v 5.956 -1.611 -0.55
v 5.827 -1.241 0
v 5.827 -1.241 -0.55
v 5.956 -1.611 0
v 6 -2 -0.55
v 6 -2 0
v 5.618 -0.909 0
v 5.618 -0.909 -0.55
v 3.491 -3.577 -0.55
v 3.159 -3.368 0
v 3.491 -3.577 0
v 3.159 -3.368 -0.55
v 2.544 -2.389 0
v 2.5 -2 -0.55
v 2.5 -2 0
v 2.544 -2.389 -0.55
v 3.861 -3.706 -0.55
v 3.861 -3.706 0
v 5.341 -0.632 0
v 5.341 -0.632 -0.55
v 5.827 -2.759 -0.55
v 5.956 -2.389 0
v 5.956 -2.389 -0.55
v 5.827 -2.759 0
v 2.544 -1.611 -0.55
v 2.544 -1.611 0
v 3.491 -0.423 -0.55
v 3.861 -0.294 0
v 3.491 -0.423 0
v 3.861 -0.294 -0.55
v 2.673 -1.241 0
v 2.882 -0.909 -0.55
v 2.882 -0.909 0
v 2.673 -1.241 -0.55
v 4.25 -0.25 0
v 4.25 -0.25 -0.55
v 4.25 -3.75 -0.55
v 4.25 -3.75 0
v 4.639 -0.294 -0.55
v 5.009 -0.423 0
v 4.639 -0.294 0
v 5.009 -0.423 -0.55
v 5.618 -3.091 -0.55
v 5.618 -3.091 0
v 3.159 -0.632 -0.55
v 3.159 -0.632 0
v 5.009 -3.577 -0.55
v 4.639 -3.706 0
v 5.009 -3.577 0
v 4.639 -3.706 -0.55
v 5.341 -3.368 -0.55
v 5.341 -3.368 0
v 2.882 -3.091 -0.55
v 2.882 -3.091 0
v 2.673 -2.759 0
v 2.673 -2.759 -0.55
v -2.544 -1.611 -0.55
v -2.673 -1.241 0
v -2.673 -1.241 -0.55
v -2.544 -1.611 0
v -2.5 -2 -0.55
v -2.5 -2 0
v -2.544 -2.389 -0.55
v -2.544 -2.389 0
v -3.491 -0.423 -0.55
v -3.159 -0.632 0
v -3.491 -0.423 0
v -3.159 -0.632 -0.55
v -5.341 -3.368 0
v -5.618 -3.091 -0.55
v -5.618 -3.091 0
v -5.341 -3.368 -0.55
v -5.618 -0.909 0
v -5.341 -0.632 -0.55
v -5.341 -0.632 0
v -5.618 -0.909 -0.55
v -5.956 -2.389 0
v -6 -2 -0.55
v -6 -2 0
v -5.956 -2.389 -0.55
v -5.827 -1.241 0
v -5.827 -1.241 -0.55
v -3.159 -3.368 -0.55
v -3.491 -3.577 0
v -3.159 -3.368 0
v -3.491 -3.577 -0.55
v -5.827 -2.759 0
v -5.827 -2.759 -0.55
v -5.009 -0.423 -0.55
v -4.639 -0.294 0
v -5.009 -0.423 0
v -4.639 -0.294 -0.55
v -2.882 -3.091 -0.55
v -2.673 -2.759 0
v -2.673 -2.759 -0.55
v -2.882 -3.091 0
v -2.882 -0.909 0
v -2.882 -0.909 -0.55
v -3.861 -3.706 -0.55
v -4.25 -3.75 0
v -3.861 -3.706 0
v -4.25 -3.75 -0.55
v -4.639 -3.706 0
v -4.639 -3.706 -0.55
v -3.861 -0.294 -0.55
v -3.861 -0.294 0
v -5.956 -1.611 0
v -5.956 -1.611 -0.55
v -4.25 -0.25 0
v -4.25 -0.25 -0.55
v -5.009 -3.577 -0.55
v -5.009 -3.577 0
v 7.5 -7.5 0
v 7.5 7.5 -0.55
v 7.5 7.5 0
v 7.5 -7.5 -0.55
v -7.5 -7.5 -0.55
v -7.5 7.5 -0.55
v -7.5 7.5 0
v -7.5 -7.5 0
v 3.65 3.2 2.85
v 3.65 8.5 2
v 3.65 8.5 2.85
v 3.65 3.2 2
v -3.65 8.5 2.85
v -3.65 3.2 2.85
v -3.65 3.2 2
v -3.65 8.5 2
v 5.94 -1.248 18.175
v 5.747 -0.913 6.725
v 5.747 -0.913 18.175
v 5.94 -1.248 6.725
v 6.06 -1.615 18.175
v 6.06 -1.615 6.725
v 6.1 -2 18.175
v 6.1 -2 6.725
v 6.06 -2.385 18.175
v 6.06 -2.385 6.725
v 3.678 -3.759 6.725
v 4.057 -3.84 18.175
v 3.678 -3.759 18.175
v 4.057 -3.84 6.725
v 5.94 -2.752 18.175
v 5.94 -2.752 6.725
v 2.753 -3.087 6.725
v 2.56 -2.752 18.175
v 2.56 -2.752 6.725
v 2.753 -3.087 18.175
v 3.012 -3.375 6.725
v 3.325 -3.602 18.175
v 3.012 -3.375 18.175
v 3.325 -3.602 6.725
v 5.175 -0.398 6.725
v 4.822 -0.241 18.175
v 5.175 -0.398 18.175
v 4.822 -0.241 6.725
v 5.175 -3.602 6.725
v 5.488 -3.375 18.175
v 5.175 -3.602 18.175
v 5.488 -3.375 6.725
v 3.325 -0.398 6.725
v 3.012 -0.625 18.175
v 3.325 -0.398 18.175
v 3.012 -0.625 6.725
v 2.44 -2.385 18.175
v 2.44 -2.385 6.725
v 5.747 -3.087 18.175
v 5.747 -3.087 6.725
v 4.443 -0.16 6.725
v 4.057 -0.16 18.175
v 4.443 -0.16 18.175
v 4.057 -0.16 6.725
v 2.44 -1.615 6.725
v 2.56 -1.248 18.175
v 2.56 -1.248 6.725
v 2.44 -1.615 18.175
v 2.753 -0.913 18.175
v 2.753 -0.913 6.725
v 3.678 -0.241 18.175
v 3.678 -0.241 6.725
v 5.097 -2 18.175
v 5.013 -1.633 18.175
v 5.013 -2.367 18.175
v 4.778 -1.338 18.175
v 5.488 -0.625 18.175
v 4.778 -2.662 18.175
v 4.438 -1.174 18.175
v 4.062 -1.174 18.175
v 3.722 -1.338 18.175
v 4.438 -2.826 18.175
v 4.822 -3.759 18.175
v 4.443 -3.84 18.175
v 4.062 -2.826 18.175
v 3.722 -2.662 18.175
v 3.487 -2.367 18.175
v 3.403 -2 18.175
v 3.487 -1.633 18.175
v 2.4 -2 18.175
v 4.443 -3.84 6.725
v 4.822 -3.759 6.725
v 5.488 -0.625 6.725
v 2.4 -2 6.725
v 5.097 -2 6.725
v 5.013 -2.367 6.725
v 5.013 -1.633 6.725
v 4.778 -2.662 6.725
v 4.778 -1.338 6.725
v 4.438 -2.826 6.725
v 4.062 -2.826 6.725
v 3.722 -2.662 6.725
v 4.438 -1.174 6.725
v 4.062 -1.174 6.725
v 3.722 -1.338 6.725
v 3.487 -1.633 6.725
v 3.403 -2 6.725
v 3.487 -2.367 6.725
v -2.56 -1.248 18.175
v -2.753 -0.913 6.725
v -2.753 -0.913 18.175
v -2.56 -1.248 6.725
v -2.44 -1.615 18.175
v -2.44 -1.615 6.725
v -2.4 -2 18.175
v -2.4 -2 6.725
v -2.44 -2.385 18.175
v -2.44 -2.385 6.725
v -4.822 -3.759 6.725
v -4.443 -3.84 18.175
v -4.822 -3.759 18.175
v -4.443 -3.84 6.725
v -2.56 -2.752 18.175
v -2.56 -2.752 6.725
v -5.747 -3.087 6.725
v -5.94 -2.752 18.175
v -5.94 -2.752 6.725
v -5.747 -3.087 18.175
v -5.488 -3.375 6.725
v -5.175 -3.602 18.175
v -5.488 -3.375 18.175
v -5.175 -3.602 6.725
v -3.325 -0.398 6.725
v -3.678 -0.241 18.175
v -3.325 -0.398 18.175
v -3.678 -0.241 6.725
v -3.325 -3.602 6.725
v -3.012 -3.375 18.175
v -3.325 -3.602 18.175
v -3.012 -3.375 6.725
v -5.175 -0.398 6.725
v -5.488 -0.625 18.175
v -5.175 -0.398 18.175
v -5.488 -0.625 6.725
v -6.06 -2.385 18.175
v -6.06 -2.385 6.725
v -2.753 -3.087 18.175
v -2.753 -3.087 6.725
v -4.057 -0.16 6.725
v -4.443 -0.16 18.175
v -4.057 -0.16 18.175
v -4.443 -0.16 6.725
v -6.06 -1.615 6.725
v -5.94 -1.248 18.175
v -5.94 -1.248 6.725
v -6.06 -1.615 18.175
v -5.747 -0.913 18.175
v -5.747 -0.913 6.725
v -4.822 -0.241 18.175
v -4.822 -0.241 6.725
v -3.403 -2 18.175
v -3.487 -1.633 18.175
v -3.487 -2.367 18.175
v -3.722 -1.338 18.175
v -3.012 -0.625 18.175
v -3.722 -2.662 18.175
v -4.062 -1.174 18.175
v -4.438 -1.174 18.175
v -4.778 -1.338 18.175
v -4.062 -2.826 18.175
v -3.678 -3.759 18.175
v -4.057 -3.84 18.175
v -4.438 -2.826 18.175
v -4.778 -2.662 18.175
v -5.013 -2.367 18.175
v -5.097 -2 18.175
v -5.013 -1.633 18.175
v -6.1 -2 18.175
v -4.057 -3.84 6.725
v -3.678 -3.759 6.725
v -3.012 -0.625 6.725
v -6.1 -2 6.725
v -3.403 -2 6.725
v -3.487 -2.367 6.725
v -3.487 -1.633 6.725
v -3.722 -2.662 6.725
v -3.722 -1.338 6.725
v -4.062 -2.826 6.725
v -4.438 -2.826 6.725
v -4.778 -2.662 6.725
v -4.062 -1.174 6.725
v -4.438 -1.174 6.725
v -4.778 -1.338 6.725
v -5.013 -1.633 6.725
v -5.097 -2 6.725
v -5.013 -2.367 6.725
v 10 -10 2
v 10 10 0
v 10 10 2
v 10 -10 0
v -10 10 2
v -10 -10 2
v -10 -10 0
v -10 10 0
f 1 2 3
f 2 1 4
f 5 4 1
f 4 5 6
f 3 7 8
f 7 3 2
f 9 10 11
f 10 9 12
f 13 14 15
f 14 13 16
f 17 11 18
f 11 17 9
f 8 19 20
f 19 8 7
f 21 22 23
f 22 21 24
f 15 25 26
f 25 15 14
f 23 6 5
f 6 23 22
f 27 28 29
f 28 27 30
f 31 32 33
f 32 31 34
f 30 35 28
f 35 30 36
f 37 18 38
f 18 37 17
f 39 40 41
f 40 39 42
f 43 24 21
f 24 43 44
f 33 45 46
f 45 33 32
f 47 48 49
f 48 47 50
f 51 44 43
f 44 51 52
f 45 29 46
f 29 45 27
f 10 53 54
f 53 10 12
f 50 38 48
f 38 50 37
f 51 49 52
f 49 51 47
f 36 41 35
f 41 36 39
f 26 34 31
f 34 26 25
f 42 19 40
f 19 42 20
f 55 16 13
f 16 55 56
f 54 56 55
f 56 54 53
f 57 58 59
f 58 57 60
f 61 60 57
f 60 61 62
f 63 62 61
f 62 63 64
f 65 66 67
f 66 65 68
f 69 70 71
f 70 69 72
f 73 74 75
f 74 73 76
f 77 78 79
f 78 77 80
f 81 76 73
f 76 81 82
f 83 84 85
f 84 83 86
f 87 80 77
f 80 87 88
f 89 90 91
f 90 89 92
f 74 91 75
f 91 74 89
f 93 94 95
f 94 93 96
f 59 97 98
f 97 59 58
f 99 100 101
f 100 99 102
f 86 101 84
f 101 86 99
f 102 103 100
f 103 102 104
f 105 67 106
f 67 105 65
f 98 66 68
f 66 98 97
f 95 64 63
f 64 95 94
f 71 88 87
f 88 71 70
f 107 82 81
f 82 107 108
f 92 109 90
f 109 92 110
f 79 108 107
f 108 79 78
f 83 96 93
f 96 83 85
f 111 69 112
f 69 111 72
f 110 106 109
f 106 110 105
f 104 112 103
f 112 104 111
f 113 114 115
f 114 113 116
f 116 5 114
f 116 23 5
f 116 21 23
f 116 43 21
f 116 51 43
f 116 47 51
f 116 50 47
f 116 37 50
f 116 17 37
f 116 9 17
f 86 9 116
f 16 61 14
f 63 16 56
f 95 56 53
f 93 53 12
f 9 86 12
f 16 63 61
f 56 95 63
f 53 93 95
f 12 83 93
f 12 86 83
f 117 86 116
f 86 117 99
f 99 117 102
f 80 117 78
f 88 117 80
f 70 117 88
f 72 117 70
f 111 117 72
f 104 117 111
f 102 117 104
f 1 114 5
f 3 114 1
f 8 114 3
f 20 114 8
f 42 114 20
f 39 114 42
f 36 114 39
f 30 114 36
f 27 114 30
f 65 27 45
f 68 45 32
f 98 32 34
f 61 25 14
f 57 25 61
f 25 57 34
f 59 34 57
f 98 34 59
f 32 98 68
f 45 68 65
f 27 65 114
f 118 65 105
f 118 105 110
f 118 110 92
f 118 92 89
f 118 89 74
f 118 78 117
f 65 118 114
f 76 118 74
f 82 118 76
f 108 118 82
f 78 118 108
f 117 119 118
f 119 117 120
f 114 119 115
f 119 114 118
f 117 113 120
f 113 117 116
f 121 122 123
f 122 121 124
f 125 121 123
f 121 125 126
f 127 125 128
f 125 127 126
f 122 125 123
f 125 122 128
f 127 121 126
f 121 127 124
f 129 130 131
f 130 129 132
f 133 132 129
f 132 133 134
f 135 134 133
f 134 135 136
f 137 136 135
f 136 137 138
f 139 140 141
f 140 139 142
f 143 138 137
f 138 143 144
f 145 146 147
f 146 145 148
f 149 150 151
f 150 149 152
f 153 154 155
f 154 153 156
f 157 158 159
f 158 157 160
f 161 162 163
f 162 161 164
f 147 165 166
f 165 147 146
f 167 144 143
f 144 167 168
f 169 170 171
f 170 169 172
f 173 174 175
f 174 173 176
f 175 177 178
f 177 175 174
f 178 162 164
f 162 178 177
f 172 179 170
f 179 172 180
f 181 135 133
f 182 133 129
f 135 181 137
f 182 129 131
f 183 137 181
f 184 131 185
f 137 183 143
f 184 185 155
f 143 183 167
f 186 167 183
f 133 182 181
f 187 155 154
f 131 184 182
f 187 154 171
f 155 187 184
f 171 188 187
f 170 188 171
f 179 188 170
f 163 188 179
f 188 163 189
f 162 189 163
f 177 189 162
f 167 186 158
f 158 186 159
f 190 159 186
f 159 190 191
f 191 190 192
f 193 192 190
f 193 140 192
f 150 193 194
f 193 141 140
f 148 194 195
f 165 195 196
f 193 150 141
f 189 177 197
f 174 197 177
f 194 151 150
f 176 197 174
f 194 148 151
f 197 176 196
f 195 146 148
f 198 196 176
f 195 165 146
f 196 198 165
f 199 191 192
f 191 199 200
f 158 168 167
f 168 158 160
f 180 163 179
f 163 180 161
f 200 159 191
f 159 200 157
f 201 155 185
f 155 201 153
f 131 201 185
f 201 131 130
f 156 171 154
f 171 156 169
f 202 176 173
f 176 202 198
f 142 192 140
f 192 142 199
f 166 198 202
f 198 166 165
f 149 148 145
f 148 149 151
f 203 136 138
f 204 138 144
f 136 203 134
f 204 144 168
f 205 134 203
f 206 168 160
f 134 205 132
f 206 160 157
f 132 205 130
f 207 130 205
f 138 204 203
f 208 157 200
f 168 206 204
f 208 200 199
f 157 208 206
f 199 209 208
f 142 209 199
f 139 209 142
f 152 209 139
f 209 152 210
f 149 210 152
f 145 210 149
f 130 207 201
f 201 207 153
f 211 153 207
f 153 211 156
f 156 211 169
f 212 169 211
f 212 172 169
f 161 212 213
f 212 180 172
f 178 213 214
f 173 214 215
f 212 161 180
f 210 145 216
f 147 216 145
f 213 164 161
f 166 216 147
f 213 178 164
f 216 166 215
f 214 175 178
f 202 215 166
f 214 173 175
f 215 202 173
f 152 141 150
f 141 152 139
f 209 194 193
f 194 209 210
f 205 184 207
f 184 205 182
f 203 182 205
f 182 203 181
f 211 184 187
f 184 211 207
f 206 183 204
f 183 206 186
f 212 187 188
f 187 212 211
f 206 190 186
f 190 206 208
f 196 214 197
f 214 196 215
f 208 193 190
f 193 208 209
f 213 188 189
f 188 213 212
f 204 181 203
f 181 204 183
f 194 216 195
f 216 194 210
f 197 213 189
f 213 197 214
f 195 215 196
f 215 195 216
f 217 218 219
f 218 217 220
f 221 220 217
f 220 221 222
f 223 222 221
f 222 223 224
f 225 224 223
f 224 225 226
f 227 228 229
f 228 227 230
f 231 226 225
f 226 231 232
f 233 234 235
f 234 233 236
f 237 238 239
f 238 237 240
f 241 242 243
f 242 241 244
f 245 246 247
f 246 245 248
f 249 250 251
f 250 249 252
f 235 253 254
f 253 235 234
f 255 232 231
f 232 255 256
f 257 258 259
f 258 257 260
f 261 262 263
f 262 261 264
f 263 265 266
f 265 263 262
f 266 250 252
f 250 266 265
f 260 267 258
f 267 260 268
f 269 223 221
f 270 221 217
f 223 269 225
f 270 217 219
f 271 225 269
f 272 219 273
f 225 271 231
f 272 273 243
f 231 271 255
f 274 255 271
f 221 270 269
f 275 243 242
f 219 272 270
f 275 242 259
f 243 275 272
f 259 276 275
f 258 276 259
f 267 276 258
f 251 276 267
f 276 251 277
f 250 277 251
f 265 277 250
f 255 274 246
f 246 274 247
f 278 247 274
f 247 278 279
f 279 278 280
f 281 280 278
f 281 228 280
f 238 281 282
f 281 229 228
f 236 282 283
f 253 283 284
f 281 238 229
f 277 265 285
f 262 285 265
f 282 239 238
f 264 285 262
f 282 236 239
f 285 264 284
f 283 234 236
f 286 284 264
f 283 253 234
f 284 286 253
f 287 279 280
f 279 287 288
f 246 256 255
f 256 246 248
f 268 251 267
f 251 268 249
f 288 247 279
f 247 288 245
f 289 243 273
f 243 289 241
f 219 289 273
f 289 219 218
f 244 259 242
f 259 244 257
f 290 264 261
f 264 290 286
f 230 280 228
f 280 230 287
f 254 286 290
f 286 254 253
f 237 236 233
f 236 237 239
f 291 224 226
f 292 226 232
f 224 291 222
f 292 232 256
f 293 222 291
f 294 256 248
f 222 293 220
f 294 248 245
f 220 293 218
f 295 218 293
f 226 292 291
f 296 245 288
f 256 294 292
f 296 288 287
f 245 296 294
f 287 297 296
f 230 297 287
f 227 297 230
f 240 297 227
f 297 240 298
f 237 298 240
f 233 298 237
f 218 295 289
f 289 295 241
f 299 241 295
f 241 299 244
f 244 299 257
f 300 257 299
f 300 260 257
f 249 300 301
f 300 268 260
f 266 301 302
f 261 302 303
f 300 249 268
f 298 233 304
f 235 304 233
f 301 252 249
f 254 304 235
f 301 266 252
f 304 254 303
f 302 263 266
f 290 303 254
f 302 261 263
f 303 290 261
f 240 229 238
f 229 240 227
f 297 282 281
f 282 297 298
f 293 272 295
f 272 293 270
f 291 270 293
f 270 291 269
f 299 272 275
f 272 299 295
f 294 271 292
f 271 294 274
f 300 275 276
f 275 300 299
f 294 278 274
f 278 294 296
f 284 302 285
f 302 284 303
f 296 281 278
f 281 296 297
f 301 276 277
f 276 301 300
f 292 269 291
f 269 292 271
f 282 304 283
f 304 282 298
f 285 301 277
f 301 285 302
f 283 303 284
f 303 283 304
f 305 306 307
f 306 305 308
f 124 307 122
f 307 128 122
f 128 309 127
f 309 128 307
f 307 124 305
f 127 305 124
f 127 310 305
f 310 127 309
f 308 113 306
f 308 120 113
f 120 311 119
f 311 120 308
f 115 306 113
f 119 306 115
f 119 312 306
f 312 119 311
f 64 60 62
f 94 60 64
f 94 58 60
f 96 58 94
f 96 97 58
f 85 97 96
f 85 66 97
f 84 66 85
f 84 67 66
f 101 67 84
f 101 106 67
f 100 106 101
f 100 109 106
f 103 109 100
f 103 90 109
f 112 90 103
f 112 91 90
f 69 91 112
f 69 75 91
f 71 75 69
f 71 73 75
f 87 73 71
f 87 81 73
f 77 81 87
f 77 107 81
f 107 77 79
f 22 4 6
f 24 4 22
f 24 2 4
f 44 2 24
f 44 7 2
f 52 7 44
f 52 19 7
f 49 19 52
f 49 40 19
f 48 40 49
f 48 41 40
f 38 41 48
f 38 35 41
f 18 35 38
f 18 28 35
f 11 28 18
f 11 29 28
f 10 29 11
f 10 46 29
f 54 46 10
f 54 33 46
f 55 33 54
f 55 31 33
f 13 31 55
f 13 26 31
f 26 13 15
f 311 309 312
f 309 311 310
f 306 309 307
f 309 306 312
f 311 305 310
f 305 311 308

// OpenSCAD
// file: usb_board.scad
// USB Connector Board

include <dimensions.scad>

module usb_board() {
  // Board
  color("green")
    difference() {
      cube([usb_board_w, usb_board_d, usb_board_h], center=true);

      translate([0, -((usb_board_d/2)-usb_hole_d_of), -usb_board_h]) {
        translate([usb_hole_w_of/2, 0, 0])
          cylinder(d=usb_hole_d, h=usb_board_h*2);

        translate([-usb_hole_w_of/2, 0, 0])
          cylinder(d=usb_hole_d, h=usb_board_h*2);
      }
    }

  // Connector
  color("grey")
    translate([0, usb_board_d/2 - usb_conn_d/2 + usb_conn_d_of, usb_board_h/2 + usb_conn_h/2])
    cube([usb_conn_w, usb_conn_d, usb_conn_h], center=true);
}

usb_board();
// file: dimensions.scad
// Dimensions (in mm)

// Minimal Clearance
_min_cl = 0.2;

// Enclosure

enc_w = 38;
enc_d = 65;
enc_h = 20.5;

enc_tk = 2;

// Enclosure Lid

lid_h = enc_tk;

// Lid Screw Holes

lid_hole_r = 3.2/2;  // M3 screws
lid_hole_h = lid_h * 1.2;

lid_pocket_r = 6.4 / 2;  // Screw Head Pocket
lid_pocket_h = 1.1;

// Screw Inserts

screw_ins_r = 4.2/2;
screw_ins_h = 6;

screw_ins_h_of = enc_h / 2 - screw_ins_h + _min_cl * 1.1;

// Screw Supports

screw_sup_w = screw_ins_r * 2 + 2.2;
screw_sup_d = screw_ins_r * 2 + 2.2;
screw_sup_h = enc_h - enc_tk;

screw_sup_w_of = enc_w/2 - screw_sup_w/2 - enc_tk + 1;
screw_sup_d_of = enc_d/2 - screw_sup_d/2 - enc_tk + 1;
screw_sup_h_of = enc_tk/2;

// Enclosure Mesh

enc_mesh_tk = 1;

// ESP Board

esp_board_w = 15;     // 14.78
esp_board_d = 25;     // 24.60
esp_board_h = 3;      // 3.14
esp_board_w_of = 0.4; // Not measured

esp_conn_h = 2.9; // 2.90

// DHT Board

dht_board_w = 21;  // 20.90
dht_board_d = 26;  // 25.29
dht_board_h = 1.6; // 1.61

dht_enc_d_of = -(enc_d / 2 - dht_board_d / 2) + enc_tk + 2;  // Distance from the enclosure
dht_enc_h_of = enc_tk + 1.5;

dht_conn_w = 11;     // 10.52
dht_conn_d = 5;      // 4.93
dht_conn_h = 9;      // 8.88
dht_conn_w_of = 1.5; // 11.54

dht_w = 13;     // 12.54
dht_d = 16;     // 16.20
dht_h = 6;      // 6.01
dht_d_of = 0.8; // Offset from DHT module and board

// TODO: Validate dimensions
dht_slot_w = dht_w;
dht_slot_d = dht_d;
dht_slot_h = enc_tk + _min_cl * 2;

dht_slot_w_of = 4;  // Make dependent
dht_slot_d_of = 6.3;  // Make dependent
dht_slot_h_of = -enc_h / 2 + enc_tk / 2;

dht_btn_w = 3;      // 3.33
dht_btn_d = 6;      // 6.06
dht_btn_h = 3;      // 2.99
dht_btn_d_of = 1.8; // 1.84

// USB Board

usb_board_w = 15;  // 14.48
usb_board_d = 15;  // 14.85
usb_board_h = 1.1; // 1.10

// Distance from the enclosure
usb_enc_d_of = enc_d / 2 - usb_board_d / 2 - enc_tk - 1;
usb_enc_h_of = enc_tk + 12;

usb_conn_w = 7.3;  // 7.30
usb_conn_d = 5.3;  // 5.26
usb_conn_h = 2.3;  // 2.32
usb_conn_d_of = 1; // 1.02

usb_hole_d = 3.5;    // 3.48
usb_hole_w_of = 8.5; // 8.45 - Between the holes. Assuming they're centered.
usb_hole_d_of = 5.5; // 5.50 - From oposite side of USB connector

usb_sup_base_d = 3.7;
usb_sup_base_h = usb_enc_h_of - enc_tk - usb_board_h / 2;

usb_sup_hole_d = 1.4 * 1.1;  // For M1.6 screws, 110% tolerance
usb_sup_hole_h = usb_sup_base_h / 2;

usb_sup_base_w_of = usb_hole_w_of / 2 ;
usb_sup_base_d_of = usb_enc_d_of - enc_tk; // From lid center
usb_sup_base_h_of = -enc_h / 2 + enc_tk;

usb_slot_w = usb_conn_w + 4;
usb_slot_d = enc_tk + _min_cl *2;
usb_slot_h = usb_conn_h + 4;

usb_slot_w_of = 0;
usb_slot_d_of = enc_d / 2 - usb_slot_d / 2 + _min_cl;
usb_slot_h_of = -enc_h / 2 + enc_tk + usb_sup_base_h - usb_conn_h / 2;

usb_sup_rein_tk = .8;

usb_sup_rein_w = usb_hole_w_of * 2;
usb_sup_rein_d = usb_hole_w_of;
usb_sup_rein_h = usb_sup_base_h / 2;

usb_sup_rein_w_of = usb_hole_w_of / 2;
usb_sup_rein_d_of = usb_sup_base_d_of;
usb_sup_rein_h_of = usb_sup_base_h_of + usb_sup_rein_h / 2;

usb_sup_hole_h_of = usb_sup_rein_h + _min_cl;
// main file
// USB Board Support Fit Test
// Simplified model of the USB Board support to test dimensions and proper fit.

$fa = 1;
$fs = .4;

include <dimensions.scad>
include <usb_board.scad>

module usb_fit_test() {
  support_h = 2;
  translate([0, 0, support_h/2])
    cube([20, 20, support_h], center=true);

  translate([
      0,
      -((usb_board_d/2)-usb_hole_d_of),
      support_h/2 + usb_sup_base_h/2
    ]) {
    translate([usb_hole_w_of/2, 0, 0])
      difference() {
        cylinder(d=usb_sup_base_d, h=usb_sup_base_h);
        cylinder(d=usb_sup_hole_d * 1.1, h=usb_sup_base_h);
      }

    translate([-usb_hole_w_of/2, 0, 0])
      difference() {
        cylinder(d=usb_sup_base_d, h=usb_sup_base_h);
        cylinder(d=usb_sup_hole_d * 1.1, h=usb_sup_base_h);
      }
  }

  // translate([0, 0, support_h + usb_sup_base_h + usb_board_h/2 + 0.1])
  //   usb_board();
}

usb_fit_test();
